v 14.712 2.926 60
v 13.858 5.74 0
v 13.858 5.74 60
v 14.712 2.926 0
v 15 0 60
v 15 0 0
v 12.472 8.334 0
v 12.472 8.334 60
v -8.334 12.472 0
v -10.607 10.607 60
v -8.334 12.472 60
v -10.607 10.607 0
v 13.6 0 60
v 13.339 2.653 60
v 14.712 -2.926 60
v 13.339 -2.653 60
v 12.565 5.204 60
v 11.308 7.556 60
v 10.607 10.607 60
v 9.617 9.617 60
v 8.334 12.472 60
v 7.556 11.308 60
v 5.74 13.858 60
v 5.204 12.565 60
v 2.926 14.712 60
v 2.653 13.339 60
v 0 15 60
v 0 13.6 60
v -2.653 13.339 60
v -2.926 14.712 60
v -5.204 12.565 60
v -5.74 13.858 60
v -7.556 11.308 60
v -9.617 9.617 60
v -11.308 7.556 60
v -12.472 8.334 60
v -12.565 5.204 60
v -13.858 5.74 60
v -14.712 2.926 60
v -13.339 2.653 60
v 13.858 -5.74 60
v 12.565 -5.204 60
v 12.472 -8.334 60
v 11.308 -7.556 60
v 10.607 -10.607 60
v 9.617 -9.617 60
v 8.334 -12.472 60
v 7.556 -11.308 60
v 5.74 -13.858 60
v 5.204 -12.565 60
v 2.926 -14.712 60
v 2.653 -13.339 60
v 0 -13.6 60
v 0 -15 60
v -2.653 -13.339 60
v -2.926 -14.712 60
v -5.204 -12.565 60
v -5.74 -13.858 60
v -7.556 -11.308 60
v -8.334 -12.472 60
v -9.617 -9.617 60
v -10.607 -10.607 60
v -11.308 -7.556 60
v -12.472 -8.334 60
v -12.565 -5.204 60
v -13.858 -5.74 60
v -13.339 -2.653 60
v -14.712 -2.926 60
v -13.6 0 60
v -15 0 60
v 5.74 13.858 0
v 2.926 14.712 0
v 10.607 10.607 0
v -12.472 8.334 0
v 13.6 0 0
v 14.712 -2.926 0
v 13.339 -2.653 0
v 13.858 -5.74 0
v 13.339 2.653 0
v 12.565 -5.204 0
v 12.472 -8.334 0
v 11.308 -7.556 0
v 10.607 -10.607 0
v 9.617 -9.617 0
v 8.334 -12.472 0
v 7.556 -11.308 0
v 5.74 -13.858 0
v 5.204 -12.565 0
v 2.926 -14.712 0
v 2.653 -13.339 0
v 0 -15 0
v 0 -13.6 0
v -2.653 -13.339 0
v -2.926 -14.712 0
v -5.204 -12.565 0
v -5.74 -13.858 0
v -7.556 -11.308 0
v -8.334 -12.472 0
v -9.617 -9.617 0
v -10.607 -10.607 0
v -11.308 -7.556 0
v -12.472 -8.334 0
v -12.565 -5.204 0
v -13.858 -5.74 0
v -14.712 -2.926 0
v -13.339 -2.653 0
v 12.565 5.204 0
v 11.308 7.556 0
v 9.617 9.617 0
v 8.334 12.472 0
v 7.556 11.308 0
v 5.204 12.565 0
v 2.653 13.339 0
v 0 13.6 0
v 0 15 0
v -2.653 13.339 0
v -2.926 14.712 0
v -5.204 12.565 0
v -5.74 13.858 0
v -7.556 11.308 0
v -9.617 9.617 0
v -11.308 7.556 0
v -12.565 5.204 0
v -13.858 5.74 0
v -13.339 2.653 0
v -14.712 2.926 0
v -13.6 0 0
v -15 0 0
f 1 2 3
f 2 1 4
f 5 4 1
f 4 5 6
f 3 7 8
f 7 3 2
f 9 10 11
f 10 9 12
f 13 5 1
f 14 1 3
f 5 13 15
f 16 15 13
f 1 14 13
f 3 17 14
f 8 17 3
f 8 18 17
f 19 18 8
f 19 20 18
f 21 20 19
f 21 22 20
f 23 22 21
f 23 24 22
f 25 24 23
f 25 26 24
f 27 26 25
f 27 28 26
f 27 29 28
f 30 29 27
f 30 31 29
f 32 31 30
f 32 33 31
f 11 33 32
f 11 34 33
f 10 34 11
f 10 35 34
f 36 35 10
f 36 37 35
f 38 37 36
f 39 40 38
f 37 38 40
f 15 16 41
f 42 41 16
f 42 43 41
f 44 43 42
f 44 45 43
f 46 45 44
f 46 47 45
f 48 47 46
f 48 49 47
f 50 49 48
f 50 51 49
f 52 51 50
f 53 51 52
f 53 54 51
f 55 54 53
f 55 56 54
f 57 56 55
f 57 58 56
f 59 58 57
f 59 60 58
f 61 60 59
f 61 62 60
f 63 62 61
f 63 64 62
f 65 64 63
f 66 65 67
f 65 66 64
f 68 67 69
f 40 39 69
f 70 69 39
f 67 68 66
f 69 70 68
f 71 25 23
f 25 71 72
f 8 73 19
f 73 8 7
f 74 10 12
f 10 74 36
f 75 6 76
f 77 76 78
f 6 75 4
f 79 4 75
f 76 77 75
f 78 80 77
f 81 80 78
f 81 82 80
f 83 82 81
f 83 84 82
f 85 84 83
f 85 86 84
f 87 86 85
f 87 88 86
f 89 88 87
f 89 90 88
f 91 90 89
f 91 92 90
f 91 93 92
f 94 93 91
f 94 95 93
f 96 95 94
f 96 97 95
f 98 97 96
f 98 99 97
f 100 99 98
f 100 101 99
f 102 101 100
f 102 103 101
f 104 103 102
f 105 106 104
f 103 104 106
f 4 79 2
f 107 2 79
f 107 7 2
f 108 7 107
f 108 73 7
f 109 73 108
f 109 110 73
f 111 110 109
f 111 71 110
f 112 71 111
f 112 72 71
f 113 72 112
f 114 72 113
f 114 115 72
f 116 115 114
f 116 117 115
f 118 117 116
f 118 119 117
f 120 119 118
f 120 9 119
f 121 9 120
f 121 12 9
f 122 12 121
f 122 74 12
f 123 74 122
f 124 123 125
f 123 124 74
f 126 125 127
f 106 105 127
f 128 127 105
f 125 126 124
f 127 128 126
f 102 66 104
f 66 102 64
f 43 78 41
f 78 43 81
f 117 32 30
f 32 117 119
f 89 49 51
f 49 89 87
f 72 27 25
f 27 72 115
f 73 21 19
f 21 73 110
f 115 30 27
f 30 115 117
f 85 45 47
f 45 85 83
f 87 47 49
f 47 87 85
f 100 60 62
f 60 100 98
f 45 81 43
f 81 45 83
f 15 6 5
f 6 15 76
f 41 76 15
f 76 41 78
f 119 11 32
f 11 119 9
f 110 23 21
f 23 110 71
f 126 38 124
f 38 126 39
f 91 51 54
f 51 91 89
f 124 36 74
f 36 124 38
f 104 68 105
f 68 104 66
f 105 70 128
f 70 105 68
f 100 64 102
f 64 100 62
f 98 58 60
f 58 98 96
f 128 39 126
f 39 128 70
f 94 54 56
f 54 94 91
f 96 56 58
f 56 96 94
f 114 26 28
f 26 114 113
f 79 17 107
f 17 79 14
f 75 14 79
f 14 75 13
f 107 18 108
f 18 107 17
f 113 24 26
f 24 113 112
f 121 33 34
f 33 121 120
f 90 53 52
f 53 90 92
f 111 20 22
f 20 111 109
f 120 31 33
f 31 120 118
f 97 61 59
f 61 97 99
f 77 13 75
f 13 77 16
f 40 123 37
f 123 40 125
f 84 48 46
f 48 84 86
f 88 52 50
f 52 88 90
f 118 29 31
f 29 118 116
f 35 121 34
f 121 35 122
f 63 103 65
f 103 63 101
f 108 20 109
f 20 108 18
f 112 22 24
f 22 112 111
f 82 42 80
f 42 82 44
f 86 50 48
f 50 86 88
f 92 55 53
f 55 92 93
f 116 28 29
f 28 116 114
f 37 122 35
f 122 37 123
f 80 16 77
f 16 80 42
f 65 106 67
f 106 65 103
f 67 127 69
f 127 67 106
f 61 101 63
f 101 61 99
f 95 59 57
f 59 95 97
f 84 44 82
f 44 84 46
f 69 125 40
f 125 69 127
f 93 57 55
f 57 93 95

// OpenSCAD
$fn = 32;

// ----------------------------------------------------------------------
// Thin tube: 1.4 mm wall
// ----------------------------------------------------------------------

// --- parameters (mm) ---
tube_od = 30;             // outer diameter
tube_h = 60;              // height, Z
wall = 1.4;               // wall thickness

difference() {
  cylinder(h = tube_h, d = tube_od);
  translate([0, 0, -1]) cylinder(h = tube_h + 2, d = tube_od - 2 * wall);
}
